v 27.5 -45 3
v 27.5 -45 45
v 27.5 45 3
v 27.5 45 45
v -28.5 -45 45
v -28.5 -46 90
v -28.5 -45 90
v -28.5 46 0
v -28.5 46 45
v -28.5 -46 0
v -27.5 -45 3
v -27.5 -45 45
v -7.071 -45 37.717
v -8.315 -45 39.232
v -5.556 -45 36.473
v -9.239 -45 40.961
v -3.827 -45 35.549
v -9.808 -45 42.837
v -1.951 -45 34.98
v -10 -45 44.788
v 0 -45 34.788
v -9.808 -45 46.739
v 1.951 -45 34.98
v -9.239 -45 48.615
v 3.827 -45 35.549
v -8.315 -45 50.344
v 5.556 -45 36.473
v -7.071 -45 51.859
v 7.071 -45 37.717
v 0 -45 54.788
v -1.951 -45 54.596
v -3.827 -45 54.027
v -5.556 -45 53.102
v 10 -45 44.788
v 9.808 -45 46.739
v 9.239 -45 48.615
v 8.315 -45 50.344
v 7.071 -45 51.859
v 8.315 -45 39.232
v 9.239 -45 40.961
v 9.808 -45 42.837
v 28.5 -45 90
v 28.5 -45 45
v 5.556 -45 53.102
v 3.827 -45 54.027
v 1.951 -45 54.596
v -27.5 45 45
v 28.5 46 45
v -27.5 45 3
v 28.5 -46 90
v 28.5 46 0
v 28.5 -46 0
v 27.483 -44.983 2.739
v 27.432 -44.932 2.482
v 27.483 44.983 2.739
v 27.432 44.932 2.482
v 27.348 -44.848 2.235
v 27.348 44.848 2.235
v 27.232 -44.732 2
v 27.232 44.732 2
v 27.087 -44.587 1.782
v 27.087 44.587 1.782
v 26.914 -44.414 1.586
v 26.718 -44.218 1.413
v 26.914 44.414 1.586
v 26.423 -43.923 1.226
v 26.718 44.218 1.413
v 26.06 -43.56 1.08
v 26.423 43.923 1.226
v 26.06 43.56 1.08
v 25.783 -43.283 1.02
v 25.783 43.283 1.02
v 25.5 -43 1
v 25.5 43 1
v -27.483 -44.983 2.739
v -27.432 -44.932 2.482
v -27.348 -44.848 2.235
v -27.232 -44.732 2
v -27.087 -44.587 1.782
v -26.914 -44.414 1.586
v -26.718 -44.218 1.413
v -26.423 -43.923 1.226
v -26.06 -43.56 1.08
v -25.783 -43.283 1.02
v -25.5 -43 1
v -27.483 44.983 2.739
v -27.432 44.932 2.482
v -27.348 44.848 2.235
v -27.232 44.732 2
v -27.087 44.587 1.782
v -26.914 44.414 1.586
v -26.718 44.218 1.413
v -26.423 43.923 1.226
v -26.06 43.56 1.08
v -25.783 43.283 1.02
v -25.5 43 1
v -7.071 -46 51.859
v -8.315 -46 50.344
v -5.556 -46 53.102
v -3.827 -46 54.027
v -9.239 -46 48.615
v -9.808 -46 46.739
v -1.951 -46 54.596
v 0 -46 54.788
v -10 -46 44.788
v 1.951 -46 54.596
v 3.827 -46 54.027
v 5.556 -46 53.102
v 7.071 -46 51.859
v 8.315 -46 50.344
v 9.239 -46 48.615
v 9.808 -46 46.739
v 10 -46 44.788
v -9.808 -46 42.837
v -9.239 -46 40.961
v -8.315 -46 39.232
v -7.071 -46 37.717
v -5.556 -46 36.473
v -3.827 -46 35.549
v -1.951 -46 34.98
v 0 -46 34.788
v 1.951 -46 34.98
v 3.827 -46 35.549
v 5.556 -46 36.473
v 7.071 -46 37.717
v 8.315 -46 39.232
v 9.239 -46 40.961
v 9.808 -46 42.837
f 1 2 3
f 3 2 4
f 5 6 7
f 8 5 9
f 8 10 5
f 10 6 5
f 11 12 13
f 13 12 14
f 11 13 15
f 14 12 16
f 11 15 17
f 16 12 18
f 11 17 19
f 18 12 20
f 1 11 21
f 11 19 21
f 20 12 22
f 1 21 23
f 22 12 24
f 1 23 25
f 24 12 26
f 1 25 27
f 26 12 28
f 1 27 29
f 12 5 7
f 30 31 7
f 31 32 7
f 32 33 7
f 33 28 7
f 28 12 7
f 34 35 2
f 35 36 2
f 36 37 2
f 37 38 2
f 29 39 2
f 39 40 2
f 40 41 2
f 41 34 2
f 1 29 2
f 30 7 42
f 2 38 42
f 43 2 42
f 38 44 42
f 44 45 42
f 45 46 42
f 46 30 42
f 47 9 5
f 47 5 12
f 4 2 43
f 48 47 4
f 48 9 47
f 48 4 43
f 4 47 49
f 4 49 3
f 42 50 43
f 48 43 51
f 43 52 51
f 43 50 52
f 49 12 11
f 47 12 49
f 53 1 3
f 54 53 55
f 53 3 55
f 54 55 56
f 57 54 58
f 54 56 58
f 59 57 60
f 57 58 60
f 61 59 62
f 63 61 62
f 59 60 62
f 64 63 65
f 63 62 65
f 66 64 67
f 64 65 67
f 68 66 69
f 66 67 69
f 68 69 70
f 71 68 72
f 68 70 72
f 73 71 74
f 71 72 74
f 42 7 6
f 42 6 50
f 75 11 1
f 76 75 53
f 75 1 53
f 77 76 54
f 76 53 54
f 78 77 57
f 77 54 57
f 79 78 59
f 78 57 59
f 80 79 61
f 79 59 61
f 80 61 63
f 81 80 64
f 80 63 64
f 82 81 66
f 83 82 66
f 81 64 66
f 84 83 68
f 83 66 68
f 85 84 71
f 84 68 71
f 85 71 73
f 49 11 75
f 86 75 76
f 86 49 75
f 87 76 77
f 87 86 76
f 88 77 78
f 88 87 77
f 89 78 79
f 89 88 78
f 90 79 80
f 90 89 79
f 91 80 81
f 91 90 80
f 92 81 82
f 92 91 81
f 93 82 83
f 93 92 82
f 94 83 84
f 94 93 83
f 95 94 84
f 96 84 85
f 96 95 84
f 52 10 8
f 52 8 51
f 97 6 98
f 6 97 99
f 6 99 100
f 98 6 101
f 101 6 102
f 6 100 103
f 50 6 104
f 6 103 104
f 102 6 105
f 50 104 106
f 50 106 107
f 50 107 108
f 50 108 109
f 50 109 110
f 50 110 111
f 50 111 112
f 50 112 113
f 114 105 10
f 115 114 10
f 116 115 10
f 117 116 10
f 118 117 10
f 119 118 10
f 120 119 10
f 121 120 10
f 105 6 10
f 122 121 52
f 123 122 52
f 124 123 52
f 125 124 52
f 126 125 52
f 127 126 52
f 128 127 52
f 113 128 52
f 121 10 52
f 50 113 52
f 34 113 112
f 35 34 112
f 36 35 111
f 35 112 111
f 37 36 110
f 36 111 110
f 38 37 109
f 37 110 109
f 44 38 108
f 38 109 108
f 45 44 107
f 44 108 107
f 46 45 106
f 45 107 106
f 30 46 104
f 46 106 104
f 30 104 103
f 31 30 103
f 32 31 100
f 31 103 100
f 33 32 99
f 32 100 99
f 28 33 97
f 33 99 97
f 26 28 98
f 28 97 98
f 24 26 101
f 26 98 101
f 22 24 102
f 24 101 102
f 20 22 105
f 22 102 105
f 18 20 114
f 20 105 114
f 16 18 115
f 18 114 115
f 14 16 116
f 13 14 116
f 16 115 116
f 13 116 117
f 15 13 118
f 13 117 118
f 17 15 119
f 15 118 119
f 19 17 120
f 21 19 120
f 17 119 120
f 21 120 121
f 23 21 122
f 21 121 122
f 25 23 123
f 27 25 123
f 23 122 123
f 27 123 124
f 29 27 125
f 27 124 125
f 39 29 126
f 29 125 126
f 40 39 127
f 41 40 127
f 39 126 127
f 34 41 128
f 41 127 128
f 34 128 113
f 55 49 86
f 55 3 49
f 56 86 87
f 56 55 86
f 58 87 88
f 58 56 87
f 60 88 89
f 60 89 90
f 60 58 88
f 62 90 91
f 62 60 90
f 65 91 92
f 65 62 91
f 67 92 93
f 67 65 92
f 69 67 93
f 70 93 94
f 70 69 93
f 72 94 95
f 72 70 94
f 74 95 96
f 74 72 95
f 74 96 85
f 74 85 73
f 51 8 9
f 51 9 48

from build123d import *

# Parameters (mm, degrees)
F0_W     = 57
F0_H     = 92
F1_DEPTH = 90
F2_W     = 55
F2_H     = 90
F3_DEPTH = 89
F4_W     = 57
F4_H     = 91
F5_DEPTH = 45
F6_R     = 10
F7_DEPTH = 1
F8_R     = 2


with BuildPart() as f1:
    # F0 (on Top) → F1 (new body)
    with BuildSketch(Plane.XY):
        Rectangle(F0_W, F0_H)
    extrude(amount=F1_DEPTH)

    # F2 (on face) → F3 (cut)
    with BuildSketch(Plane.XY.offset(90)):
        Rectangle(F2_W, F2_H)
    extrude(amount=-F3_DEPTH, mode=Mode.SUBTRACT)

    # F4 (on face) → F5 (cut)
    with BuildSketch(Plane.XY.offset(90)):
        with Locations((0, 0.5)):
            Rectangle(F4_W, F4_H)
    extrude(amount=-F5_DEPTH, mode=Mode.SUBTRACT)

    # F6 (on face) → F7 (cut)
    with BuildSketch(Plane.XZ.offset(46)):
        with Locations((0, 44.787799)):
            Circle(F6_R)
    extrude(amount=-F7_DEPTH, mode=Mode.SUBTRACT)

    # F8
    f8_edges = [f1.edges().sort_by_distance(p)[0] for p in [
        (27.5, 0, 1),
        (0, 45, 1),
        (-27.5, 0, 1),
        (0, -45, 1),
    ]]
    fillet(f8_edges, radius=F8_R)


solid = f1.part
